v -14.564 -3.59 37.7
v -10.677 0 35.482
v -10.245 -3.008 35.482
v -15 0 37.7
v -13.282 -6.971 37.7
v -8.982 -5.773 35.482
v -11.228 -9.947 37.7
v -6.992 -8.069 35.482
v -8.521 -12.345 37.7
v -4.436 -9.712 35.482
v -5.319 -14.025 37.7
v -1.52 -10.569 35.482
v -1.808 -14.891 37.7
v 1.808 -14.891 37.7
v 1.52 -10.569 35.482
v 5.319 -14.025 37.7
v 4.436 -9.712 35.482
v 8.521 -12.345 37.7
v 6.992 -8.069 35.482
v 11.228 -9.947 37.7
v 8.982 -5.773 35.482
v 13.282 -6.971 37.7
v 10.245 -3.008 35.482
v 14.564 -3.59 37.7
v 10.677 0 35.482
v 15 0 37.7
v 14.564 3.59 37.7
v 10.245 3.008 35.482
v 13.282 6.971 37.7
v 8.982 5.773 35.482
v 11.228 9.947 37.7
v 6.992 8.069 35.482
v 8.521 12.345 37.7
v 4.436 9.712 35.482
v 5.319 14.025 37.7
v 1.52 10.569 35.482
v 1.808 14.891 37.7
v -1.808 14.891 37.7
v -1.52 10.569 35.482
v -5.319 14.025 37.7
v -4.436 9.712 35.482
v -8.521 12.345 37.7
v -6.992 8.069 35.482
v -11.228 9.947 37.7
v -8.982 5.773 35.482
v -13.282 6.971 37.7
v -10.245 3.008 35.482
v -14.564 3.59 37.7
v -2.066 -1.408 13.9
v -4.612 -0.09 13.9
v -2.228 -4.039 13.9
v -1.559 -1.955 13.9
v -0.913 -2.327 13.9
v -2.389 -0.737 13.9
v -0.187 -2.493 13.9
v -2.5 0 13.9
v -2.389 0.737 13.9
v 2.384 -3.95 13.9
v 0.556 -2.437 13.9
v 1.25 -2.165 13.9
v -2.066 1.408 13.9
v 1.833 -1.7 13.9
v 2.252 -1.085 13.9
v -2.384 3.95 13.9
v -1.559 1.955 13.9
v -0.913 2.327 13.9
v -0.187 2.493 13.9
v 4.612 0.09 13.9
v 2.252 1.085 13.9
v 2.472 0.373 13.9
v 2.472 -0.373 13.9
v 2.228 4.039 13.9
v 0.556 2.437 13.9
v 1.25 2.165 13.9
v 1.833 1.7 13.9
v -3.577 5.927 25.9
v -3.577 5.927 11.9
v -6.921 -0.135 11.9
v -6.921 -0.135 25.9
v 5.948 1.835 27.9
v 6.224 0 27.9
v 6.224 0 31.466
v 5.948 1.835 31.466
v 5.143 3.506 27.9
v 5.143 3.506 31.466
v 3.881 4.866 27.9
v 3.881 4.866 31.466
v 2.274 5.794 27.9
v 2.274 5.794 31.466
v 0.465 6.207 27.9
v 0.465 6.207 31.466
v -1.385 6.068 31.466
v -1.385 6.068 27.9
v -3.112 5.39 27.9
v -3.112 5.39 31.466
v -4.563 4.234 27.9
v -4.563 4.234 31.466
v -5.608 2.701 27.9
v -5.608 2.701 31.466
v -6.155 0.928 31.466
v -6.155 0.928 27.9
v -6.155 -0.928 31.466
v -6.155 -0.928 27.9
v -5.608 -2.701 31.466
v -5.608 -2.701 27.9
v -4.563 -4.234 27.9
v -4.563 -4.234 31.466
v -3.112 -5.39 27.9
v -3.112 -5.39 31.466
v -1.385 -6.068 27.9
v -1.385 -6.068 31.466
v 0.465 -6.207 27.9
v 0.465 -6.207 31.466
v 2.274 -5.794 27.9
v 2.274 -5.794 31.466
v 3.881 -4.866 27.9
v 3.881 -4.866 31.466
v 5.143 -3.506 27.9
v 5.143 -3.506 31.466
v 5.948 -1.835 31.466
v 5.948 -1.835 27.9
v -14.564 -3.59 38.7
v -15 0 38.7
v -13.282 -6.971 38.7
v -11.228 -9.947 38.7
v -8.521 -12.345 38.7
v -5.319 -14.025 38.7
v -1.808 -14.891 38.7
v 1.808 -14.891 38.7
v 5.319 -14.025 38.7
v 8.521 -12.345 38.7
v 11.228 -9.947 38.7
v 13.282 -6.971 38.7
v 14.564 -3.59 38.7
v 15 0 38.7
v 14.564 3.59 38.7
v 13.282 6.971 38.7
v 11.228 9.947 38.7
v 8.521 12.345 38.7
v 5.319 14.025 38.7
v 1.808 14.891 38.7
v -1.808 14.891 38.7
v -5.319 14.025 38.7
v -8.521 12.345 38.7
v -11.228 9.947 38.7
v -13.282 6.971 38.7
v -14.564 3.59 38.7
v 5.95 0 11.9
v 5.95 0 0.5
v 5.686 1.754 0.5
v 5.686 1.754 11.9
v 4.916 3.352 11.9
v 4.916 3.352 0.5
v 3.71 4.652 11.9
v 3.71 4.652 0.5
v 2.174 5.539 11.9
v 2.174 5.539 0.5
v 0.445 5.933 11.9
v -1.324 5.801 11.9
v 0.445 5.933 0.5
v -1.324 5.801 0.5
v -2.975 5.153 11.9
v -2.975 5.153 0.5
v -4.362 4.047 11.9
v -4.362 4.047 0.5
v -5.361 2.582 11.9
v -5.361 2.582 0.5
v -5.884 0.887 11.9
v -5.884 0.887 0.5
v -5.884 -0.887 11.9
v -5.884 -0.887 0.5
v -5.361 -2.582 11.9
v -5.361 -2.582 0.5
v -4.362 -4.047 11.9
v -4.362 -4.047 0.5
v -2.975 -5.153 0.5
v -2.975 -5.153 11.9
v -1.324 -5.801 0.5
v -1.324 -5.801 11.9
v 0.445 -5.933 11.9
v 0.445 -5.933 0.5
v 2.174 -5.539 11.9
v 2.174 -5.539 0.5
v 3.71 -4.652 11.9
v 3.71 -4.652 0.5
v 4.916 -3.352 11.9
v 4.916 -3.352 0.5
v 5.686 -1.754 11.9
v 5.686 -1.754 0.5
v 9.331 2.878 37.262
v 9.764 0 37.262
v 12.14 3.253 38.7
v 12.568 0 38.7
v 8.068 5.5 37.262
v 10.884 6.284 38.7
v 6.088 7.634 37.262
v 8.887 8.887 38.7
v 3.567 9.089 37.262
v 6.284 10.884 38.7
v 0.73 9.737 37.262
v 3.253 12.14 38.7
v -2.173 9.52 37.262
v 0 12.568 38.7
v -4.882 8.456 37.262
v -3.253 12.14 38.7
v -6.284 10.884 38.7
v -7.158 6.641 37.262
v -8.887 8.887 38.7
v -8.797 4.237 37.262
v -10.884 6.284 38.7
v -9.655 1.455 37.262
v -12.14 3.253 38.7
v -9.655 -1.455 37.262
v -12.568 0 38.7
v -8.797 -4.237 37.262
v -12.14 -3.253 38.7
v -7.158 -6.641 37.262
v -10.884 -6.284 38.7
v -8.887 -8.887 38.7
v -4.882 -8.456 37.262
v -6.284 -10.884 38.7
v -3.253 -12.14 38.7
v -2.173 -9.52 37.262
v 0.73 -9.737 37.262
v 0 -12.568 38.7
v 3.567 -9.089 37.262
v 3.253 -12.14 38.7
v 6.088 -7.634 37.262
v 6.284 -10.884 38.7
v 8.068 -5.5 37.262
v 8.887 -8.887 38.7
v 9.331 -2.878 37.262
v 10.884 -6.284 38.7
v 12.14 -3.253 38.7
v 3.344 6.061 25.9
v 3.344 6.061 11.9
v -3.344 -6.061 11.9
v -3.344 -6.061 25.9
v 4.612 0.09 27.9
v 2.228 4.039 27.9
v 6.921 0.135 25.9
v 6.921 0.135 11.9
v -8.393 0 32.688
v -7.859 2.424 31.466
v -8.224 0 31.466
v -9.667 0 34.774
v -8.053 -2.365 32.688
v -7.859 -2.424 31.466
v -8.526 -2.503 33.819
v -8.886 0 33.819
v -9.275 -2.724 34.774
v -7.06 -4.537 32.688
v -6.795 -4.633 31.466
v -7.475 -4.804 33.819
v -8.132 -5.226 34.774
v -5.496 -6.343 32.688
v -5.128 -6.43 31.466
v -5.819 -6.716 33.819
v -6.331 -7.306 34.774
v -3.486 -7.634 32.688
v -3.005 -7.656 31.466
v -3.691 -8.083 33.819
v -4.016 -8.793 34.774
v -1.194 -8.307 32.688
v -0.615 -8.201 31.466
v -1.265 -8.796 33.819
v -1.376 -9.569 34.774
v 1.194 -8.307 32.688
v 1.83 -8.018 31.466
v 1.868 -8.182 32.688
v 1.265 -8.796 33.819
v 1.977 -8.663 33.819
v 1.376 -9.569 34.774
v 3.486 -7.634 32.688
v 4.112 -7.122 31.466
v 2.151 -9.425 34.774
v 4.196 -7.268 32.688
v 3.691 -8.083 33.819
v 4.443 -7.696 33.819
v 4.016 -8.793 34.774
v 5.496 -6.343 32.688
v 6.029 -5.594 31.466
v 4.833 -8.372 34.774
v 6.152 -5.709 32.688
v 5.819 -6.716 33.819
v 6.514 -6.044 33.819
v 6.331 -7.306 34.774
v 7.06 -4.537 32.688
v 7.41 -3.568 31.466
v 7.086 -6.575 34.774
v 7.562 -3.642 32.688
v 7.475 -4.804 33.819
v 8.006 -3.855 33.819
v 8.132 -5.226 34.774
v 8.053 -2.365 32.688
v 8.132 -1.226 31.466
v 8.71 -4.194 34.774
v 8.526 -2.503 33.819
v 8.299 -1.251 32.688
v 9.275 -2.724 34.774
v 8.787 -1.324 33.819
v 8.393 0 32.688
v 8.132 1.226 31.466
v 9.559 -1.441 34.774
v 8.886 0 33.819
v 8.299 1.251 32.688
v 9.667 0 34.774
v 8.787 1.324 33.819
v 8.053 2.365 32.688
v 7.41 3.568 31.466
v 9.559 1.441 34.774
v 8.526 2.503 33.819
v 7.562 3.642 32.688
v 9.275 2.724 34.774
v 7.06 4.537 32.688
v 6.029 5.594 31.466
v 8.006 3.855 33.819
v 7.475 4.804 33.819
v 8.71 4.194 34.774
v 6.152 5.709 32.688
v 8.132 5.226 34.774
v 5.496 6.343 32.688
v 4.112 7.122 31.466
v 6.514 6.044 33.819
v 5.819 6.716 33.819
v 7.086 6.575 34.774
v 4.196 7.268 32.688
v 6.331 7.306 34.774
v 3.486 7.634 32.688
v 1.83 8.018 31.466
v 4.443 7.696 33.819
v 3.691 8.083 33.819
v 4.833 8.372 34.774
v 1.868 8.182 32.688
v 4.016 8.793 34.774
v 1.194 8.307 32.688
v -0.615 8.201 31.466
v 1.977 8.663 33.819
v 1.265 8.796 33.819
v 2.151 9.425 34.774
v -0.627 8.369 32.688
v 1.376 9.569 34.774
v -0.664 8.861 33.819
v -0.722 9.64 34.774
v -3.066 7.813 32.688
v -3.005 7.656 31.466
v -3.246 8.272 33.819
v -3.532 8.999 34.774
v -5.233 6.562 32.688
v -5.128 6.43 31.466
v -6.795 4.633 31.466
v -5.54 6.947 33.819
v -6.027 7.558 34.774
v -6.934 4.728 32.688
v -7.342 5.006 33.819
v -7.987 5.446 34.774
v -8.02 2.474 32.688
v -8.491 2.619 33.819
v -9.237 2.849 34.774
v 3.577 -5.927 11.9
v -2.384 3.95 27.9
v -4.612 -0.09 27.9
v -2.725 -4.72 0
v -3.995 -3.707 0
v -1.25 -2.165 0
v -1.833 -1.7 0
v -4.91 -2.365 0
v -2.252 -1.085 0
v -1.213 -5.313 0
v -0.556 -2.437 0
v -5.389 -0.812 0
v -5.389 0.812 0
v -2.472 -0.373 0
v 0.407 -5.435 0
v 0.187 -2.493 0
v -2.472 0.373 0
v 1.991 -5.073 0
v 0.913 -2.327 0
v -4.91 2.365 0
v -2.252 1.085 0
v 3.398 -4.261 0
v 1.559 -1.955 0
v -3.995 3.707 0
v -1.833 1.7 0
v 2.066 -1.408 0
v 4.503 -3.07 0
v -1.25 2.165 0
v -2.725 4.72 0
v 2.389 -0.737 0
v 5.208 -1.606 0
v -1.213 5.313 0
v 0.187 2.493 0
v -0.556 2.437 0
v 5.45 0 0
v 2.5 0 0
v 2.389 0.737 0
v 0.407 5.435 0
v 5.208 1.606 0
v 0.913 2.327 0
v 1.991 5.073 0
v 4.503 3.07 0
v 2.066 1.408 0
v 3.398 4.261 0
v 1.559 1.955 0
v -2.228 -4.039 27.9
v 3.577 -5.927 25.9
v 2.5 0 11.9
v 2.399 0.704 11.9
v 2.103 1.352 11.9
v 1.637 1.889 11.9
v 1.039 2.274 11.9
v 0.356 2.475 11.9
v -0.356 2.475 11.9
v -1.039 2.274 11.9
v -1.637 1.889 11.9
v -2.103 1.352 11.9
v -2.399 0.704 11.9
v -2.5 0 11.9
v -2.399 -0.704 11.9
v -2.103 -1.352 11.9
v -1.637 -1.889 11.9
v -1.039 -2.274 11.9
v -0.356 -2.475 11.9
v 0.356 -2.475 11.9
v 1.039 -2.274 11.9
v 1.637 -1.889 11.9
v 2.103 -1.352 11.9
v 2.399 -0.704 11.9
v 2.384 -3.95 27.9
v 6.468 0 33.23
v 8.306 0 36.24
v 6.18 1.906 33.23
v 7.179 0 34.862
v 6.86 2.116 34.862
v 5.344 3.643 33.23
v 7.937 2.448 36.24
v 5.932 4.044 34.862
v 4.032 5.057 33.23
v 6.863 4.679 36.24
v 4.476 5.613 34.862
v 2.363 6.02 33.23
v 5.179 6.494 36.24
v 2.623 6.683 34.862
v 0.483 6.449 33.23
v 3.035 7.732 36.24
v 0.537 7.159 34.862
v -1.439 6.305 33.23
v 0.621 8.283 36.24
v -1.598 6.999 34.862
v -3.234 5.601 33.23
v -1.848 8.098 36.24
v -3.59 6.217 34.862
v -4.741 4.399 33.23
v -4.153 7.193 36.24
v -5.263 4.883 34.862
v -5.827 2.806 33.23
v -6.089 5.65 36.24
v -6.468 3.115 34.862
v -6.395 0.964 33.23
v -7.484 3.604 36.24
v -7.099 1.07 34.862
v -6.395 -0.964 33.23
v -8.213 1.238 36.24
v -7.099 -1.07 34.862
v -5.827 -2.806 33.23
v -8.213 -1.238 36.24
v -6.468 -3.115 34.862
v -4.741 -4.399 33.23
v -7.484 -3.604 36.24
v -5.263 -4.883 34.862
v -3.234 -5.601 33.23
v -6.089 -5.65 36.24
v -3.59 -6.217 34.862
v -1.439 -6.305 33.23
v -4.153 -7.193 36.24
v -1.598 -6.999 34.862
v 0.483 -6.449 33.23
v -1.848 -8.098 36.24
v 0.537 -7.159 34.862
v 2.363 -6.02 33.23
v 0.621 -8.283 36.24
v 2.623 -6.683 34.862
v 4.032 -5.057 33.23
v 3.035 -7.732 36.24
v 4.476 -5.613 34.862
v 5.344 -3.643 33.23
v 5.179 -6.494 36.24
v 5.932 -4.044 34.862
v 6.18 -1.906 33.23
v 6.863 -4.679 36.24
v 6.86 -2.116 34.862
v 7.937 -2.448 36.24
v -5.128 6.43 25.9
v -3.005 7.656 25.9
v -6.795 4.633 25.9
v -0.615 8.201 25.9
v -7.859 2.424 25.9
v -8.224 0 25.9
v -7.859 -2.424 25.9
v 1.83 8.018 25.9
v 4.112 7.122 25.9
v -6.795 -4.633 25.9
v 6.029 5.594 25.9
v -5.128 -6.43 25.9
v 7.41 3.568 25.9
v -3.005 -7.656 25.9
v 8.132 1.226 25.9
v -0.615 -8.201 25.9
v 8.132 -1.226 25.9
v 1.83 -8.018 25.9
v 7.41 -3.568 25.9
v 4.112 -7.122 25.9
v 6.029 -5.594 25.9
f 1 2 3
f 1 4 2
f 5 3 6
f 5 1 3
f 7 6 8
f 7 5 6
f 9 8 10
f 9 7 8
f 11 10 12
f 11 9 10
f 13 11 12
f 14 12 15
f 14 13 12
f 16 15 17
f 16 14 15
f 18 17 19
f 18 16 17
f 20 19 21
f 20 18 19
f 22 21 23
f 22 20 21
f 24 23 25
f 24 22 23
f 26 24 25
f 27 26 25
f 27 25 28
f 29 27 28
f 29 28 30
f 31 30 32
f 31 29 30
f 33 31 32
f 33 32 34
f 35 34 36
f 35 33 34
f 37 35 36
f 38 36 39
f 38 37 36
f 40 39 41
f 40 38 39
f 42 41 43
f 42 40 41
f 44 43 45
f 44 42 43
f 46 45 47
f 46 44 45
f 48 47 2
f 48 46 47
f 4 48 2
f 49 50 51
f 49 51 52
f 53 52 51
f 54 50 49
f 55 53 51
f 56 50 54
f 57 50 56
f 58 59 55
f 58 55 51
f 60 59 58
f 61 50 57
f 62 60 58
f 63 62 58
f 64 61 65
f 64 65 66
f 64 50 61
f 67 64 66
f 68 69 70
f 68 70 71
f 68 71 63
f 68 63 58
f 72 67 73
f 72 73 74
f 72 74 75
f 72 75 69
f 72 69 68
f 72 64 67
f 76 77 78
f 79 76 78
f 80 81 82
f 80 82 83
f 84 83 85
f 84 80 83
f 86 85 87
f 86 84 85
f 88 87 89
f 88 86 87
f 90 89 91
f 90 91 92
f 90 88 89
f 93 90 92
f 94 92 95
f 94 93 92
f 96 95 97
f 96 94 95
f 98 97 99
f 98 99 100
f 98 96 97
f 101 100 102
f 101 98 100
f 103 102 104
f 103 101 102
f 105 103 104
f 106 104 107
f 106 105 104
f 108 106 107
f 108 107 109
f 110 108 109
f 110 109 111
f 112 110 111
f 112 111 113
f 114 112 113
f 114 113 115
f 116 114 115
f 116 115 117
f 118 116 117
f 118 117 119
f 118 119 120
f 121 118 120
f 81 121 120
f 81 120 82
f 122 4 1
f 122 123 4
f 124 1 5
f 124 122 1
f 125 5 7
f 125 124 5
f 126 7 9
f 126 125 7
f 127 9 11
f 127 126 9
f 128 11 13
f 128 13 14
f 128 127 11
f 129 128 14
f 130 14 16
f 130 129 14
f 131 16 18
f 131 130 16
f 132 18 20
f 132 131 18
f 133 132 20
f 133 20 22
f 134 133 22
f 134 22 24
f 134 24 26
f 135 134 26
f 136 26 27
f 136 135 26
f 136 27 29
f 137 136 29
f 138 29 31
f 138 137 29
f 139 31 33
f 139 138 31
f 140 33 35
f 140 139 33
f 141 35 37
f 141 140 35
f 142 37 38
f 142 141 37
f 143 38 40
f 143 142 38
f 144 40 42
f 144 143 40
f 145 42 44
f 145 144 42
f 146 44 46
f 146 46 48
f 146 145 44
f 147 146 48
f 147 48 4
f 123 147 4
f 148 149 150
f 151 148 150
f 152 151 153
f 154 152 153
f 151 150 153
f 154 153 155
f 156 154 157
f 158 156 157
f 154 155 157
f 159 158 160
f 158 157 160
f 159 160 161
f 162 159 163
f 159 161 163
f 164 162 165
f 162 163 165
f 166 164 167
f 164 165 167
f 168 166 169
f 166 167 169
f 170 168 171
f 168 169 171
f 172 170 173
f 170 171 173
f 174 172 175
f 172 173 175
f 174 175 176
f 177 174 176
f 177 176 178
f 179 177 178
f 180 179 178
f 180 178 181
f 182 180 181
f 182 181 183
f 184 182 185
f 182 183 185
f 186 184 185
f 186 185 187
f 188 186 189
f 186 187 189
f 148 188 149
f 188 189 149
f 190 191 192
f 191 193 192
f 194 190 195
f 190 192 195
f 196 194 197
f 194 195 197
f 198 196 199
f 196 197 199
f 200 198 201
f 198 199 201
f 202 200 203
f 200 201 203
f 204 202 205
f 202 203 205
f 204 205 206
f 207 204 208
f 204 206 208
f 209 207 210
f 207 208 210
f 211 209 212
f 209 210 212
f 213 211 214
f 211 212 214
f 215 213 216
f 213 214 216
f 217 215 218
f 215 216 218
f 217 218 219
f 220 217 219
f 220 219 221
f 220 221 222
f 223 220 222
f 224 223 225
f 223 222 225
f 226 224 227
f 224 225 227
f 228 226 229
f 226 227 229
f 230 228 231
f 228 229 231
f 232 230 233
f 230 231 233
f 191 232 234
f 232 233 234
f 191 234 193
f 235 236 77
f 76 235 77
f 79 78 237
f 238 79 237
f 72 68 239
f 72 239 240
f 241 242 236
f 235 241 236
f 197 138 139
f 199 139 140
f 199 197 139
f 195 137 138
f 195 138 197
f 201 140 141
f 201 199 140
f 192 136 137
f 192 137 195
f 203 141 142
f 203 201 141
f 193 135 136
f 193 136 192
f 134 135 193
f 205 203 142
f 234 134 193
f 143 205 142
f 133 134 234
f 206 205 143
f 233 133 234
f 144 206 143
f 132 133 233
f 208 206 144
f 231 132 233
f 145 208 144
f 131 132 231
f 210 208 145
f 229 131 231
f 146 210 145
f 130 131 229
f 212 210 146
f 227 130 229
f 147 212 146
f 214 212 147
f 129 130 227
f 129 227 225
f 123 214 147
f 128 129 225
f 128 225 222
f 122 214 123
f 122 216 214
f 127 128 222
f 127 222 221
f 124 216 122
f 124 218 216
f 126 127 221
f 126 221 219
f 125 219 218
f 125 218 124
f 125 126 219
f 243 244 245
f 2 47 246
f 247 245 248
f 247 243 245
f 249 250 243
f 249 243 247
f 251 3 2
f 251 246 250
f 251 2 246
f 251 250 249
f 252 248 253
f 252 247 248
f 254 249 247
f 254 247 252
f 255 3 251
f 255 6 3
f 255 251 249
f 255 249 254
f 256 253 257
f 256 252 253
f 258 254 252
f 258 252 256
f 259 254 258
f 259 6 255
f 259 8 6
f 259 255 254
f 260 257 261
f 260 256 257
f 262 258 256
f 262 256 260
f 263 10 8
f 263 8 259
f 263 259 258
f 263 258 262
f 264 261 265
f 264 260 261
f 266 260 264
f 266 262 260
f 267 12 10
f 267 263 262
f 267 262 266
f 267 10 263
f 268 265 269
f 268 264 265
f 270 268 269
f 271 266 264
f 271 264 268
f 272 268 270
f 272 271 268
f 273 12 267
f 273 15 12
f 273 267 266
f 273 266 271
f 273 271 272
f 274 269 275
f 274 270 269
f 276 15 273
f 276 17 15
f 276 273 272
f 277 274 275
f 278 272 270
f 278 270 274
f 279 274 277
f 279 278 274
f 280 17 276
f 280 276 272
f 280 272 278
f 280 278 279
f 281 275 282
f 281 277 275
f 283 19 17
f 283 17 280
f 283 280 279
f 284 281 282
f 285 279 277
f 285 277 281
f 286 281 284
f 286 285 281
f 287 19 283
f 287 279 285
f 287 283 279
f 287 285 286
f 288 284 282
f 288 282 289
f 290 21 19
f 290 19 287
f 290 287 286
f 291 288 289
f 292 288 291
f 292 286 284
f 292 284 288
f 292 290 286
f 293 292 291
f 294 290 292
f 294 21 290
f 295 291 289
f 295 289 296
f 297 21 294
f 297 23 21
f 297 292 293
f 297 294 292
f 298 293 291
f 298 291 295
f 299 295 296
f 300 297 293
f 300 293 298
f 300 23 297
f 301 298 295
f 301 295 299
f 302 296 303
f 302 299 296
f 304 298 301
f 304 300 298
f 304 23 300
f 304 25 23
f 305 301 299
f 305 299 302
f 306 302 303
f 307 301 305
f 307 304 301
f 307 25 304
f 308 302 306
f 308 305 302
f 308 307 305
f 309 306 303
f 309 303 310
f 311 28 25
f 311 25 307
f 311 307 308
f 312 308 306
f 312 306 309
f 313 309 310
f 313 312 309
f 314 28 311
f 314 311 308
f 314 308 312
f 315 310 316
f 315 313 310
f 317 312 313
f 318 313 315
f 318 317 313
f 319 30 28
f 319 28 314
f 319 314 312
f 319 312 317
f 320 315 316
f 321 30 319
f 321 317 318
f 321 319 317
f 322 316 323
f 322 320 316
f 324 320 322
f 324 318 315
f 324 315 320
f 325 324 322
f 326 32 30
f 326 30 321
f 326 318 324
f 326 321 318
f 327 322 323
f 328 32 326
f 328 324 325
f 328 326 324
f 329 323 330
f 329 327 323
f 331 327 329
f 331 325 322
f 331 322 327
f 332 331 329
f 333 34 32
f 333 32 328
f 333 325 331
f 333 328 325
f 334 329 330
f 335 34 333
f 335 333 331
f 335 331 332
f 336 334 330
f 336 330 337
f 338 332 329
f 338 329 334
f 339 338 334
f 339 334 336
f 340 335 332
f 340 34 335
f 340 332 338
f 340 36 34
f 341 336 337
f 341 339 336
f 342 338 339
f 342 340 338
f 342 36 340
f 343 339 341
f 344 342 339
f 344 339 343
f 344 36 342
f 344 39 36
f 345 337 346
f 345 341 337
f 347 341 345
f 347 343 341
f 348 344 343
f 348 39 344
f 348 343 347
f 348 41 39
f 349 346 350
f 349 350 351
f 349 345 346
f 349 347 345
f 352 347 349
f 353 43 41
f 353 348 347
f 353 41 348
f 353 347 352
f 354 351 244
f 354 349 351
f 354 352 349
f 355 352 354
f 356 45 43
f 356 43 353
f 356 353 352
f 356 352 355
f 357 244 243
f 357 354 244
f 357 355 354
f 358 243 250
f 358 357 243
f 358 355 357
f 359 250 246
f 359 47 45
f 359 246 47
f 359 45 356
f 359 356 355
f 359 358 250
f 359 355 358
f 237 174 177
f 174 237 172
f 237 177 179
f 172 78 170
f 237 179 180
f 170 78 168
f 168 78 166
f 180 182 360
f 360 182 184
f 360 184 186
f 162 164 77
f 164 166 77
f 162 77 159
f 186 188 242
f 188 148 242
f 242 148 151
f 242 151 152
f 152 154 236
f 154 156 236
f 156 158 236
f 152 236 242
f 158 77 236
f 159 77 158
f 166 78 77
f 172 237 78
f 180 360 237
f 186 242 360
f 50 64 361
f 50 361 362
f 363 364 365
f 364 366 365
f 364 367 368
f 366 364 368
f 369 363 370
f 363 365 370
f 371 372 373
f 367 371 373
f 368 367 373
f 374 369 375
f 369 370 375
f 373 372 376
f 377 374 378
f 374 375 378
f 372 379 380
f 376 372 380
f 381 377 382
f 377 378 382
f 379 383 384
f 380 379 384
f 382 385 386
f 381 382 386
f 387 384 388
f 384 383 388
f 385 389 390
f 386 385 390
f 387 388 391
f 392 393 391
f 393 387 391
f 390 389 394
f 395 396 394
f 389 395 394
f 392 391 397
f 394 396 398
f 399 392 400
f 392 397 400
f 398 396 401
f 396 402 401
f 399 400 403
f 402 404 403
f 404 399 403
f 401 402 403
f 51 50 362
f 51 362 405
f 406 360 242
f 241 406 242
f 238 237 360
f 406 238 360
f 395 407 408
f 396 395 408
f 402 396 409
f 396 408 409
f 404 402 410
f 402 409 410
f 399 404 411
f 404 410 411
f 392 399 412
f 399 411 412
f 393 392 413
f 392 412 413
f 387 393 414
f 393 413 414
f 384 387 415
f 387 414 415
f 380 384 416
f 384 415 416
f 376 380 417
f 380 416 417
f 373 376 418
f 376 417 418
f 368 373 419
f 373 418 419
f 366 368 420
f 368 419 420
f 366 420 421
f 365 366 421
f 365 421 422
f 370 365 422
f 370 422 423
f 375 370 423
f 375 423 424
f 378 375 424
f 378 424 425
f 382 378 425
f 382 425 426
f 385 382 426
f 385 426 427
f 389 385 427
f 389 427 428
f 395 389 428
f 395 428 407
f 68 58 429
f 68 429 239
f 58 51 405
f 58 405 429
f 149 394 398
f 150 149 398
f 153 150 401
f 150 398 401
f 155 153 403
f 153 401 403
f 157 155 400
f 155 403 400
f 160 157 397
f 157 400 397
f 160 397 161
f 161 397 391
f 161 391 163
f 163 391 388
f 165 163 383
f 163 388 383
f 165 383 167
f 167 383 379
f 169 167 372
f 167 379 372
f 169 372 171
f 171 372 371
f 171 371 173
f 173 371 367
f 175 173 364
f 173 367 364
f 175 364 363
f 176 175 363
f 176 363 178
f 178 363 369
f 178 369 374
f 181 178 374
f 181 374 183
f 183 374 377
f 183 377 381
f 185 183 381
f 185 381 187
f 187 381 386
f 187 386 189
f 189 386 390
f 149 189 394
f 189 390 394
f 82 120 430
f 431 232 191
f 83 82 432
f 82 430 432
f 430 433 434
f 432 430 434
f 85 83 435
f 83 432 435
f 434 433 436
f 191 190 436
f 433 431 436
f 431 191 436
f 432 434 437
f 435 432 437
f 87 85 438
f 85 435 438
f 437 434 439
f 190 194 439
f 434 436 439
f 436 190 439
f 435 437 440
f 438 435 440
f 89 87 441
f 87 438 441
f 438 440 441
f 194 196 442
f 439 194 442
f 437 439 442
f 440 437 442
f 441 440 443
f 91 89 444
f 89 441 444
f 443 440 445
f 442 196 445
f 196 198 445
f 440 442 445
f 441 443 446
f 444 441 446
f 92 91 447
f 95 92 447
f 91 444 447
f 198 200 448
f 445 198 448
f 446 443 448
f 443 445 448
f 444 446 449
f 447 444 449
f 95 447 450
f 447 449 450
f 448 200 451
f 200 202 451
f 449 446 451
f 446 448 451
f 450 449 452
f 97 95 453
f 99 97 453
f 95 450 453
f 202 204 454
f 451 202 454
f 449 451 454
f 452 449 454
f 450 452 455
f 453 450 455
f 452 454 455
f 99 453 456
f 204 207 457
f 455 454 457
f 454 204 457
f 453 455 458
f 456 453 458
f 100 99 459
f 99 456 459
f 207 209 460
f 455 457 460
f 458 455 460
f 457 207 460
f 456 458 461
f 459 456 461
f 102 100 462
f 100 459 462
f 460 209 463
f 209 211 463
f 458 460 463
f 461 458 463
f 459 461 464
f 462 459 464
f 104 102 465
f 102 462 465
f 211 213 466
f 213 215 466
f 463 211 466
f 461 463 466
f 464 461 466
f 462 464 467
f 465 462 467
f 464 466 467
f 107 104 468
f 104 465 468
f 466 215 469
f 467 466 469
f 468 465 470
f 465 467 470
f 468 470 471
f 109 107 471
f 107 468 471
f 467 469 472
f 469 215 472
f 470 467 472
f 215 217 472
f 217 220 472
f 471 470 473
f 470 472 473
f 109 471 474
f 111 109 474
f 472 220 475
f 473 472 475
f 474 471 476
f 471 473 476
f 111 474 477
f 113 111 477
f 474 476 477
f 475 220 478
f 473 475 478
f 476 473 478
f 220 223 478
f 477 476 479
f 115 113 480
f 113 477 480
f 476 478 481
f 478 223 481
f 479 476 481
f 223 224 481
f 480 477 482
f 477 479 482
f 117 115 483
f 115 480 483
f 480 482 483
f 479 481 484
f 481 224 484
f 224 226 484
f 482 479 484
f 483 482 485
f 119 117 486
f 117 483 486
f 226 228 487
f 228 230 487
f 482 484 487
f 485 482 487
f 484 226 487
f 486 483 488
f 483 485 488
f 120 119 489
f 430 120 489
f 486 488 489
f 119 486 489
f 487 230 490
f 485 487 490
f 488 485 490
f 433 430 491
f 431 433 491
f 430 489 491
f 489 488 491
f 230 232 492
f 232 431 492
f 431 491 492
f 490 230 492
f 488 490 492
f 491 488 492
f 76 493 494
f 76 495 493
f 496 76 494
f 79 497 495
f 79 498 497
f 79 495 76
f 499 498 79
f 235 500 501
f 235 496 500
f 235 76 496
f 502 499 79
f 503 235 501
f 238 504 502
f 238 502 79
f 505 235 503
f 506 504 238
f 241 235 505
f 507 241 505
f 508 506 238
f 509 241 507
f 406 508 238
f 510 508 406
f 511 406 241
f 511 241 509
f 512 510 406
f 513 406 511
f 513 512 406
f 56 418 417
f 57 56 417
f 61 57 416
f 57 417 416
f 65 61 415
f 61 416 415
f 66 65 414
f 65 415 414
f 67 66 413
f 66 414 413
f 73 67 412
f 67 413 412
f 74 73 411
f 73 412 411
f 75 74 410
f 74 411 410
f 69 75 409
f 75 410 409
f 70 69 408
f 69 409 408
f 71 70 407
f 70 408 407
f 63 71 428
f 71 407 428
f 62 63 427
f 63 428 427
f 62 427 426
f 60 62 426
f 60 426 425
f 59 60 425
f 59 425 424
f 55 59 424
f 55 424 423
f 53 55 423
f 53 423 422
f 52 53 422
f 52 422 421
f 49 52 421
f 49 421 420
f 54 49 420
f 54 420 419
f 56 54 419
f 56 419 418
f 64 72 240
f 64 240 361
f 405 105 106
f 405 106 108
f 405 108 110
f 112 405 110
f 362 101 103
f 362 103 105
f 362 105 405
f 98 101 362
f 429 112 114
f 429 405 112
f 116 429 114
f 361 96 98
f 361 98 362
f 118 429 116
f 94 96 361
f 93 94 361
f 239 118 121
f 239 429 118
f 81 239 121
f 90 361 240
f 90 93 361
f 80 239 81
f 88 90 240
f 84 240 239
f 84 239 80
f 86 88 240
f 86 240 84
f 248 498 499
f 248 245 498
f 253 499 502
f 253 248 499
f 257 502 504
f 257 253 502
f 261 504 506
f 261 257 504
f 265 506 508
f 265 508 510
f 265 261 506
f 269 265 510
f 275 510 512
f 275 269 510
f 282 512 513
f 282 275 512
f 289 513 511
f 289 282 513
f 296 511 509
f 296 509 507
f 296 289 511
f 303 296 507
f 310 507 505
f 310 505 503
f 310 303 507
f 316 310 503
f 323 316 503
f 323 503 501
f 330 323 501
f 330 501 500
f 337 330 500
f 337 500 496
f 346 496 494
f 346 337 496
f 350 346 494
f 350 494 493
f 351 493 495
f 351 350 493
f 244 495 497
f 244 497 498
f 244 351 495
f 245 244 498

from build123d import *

# Parameters (mm, degrees)
SKETCH1_R           = 5.95
BOSS_EXTRUDE1_DEPTH = 11.9
M6_TAPPED_HOLE1_D   = 5
BOSS_EXTRUDE2_DEPTH = 14
CHAMFER1_SIZE       = 0.5
SHELL1_START        = 13.9
SHELL1_DEPTH        = 24.8
SHELL1_START_2      = 27.9
SHELL1_2_OUTLINE_R  = 6.224211325
SHELL1_2_DEPTH      = 10.8
SKETCH6_R           = 2.5
CUT_EXTRUDE1_DEPTH  = 35.179526035


with BuildPart() as part:
    # Sketch1 → Boss-Extrude1 (new body)
    with BuildSketch(Plane.XY):
        Circle(SKETCH1_R)
    extrude(amount=BOSS_EXTRUDE1_DEPTH)

    # M6 Tapped Hole1 (through all)
    with Locations(Plane(origin=(0, 0, 0), x_dir=(-1, 0, 0), z_dir=(0, 0, -1))):
        with Locations((0, 0)):
            Hole(M6_TAPPED_HOLE1_D / 2)

    # Sketch4 → Boss-Extrude2 (add)
    with BuildSketch(Plane.XY.offset(11.9)):
        Polygon((6.921331173, 0.134625435), (3.34407654, 6.061361341), (-3.577254633, 5.926735906), (-6.921331173, -0.134625435), (-3.34407654, -6.061361341), (3.577254633, -5.926735906), align=None)
    extrude(amount=BOSS_EXTRUDE2_DEPTH)

    # Sketch5 → Revolve1 (revolve)
    with BuildSketch(Plane(origin=(0, 0, 0), x_dir=(1, 0, 0), z_dir=(0, 1, 0))):
        with BuildLine():
            Line((-6.921331173, -25.9), (-8.224211325, -25.9))
            Line((-8.224211325, -25.9), (-8.224211325, -31.466244152))
            ThreePointArc((-8.224211325, -31.466244152), (-8.886011508, -33.819165828), (-10.677341595, -35.48210191))
            Line((-10.677341595, -35.48210191), (-15, -37.7))
            Line((-15, -37.7), (-15, -38.7))
            Line((-15, -38.7), (0, -38.7))
            Line((0, -38.7), (0, -25.9))
            Line((0, -25.9), (-6.921331173, -25.9))
        make_face()
    revolve(axis=Axis((0, 0, 0), (0, 0, 1)))

    # Chamfer1
    chamfer1_edges = [part.edges().sort_by_distance(p)[0] for p in [
        (-5.95, 0, 0),
    ]]
    chamfer(chamfer1_edges, length=CHAMFER1_SIZE)

    # Shell1: read off the stored shape, not the designer's step
    # Shell1 outline → Shell1 (cut)
    with BuildSketch(Plane.XY.offset(SHELL1_START)):
        Polygon((-2.228488616, -4.039283965), (2.383878219, -3.949569736), (4.612366834, 0.089714229), (2.228488616, 4.039283965), (-2.383878219, 3.949569736), (-4.612366834, -0.089714229), align=None)
    extrude(amount=SHELL1_DEPTH, mode=Mode.SUBTRACT)

    # Shell1 2 outline → Shell1 2 (cut)
    with BuildSketch(Plane.XY.offset(SHELL1_START_2)):
        Circle(SHELL1_2_OUTLINE_R)
        Polygon((4.612366834, 0.089714229), (2.383878219, -3.949569736), (-2.228488616, -4.039283965), (-4.612366834, -0.089714229), (-2.383878219, 3.949569736), (2.228488616, 4.039283965), align=None, mode=Mode.SUBTRACT)
    extrude(amount=SHELL1_2_DEPTH, mode=Mode.SUBTRACT)

    # Shell1 3 outline → Shell1 3 (revolve, cut)
    with BuildSketch(Plane.XZ):
        with BuildLine():
            ThreePointArc((6.224211325, 31.466244152), (7.179257815, 34.861754834), (9.764333429, 37.261544544))
            Line((9.764333429, 37.261544544), (12.567866916, 38.7))
            Line((12.567866916, 38.7), (6.224211325, 38.7))
            Line((6.224211325, 38.7), (6.224211325, 31.466244152))
        make_face()
    revolve(axis=Axis((0, 0, 0), (0, 0, 1)), mode=Mode.SUBTRACT)

    # Sketch6 → Cut-Extrude1 (cut, through all)
    with BuildSketch(Plane(origin=(0, 0, 11.9), x_dir=(-1, 0, 0), z_dir=(0, 0, -1))):
        Circle(SKETCH6_R)
    extrude(amount=-CUT_EXTRUDE1_DEPTH, mode=Mode.SUBTRACT)


solid = part.part
